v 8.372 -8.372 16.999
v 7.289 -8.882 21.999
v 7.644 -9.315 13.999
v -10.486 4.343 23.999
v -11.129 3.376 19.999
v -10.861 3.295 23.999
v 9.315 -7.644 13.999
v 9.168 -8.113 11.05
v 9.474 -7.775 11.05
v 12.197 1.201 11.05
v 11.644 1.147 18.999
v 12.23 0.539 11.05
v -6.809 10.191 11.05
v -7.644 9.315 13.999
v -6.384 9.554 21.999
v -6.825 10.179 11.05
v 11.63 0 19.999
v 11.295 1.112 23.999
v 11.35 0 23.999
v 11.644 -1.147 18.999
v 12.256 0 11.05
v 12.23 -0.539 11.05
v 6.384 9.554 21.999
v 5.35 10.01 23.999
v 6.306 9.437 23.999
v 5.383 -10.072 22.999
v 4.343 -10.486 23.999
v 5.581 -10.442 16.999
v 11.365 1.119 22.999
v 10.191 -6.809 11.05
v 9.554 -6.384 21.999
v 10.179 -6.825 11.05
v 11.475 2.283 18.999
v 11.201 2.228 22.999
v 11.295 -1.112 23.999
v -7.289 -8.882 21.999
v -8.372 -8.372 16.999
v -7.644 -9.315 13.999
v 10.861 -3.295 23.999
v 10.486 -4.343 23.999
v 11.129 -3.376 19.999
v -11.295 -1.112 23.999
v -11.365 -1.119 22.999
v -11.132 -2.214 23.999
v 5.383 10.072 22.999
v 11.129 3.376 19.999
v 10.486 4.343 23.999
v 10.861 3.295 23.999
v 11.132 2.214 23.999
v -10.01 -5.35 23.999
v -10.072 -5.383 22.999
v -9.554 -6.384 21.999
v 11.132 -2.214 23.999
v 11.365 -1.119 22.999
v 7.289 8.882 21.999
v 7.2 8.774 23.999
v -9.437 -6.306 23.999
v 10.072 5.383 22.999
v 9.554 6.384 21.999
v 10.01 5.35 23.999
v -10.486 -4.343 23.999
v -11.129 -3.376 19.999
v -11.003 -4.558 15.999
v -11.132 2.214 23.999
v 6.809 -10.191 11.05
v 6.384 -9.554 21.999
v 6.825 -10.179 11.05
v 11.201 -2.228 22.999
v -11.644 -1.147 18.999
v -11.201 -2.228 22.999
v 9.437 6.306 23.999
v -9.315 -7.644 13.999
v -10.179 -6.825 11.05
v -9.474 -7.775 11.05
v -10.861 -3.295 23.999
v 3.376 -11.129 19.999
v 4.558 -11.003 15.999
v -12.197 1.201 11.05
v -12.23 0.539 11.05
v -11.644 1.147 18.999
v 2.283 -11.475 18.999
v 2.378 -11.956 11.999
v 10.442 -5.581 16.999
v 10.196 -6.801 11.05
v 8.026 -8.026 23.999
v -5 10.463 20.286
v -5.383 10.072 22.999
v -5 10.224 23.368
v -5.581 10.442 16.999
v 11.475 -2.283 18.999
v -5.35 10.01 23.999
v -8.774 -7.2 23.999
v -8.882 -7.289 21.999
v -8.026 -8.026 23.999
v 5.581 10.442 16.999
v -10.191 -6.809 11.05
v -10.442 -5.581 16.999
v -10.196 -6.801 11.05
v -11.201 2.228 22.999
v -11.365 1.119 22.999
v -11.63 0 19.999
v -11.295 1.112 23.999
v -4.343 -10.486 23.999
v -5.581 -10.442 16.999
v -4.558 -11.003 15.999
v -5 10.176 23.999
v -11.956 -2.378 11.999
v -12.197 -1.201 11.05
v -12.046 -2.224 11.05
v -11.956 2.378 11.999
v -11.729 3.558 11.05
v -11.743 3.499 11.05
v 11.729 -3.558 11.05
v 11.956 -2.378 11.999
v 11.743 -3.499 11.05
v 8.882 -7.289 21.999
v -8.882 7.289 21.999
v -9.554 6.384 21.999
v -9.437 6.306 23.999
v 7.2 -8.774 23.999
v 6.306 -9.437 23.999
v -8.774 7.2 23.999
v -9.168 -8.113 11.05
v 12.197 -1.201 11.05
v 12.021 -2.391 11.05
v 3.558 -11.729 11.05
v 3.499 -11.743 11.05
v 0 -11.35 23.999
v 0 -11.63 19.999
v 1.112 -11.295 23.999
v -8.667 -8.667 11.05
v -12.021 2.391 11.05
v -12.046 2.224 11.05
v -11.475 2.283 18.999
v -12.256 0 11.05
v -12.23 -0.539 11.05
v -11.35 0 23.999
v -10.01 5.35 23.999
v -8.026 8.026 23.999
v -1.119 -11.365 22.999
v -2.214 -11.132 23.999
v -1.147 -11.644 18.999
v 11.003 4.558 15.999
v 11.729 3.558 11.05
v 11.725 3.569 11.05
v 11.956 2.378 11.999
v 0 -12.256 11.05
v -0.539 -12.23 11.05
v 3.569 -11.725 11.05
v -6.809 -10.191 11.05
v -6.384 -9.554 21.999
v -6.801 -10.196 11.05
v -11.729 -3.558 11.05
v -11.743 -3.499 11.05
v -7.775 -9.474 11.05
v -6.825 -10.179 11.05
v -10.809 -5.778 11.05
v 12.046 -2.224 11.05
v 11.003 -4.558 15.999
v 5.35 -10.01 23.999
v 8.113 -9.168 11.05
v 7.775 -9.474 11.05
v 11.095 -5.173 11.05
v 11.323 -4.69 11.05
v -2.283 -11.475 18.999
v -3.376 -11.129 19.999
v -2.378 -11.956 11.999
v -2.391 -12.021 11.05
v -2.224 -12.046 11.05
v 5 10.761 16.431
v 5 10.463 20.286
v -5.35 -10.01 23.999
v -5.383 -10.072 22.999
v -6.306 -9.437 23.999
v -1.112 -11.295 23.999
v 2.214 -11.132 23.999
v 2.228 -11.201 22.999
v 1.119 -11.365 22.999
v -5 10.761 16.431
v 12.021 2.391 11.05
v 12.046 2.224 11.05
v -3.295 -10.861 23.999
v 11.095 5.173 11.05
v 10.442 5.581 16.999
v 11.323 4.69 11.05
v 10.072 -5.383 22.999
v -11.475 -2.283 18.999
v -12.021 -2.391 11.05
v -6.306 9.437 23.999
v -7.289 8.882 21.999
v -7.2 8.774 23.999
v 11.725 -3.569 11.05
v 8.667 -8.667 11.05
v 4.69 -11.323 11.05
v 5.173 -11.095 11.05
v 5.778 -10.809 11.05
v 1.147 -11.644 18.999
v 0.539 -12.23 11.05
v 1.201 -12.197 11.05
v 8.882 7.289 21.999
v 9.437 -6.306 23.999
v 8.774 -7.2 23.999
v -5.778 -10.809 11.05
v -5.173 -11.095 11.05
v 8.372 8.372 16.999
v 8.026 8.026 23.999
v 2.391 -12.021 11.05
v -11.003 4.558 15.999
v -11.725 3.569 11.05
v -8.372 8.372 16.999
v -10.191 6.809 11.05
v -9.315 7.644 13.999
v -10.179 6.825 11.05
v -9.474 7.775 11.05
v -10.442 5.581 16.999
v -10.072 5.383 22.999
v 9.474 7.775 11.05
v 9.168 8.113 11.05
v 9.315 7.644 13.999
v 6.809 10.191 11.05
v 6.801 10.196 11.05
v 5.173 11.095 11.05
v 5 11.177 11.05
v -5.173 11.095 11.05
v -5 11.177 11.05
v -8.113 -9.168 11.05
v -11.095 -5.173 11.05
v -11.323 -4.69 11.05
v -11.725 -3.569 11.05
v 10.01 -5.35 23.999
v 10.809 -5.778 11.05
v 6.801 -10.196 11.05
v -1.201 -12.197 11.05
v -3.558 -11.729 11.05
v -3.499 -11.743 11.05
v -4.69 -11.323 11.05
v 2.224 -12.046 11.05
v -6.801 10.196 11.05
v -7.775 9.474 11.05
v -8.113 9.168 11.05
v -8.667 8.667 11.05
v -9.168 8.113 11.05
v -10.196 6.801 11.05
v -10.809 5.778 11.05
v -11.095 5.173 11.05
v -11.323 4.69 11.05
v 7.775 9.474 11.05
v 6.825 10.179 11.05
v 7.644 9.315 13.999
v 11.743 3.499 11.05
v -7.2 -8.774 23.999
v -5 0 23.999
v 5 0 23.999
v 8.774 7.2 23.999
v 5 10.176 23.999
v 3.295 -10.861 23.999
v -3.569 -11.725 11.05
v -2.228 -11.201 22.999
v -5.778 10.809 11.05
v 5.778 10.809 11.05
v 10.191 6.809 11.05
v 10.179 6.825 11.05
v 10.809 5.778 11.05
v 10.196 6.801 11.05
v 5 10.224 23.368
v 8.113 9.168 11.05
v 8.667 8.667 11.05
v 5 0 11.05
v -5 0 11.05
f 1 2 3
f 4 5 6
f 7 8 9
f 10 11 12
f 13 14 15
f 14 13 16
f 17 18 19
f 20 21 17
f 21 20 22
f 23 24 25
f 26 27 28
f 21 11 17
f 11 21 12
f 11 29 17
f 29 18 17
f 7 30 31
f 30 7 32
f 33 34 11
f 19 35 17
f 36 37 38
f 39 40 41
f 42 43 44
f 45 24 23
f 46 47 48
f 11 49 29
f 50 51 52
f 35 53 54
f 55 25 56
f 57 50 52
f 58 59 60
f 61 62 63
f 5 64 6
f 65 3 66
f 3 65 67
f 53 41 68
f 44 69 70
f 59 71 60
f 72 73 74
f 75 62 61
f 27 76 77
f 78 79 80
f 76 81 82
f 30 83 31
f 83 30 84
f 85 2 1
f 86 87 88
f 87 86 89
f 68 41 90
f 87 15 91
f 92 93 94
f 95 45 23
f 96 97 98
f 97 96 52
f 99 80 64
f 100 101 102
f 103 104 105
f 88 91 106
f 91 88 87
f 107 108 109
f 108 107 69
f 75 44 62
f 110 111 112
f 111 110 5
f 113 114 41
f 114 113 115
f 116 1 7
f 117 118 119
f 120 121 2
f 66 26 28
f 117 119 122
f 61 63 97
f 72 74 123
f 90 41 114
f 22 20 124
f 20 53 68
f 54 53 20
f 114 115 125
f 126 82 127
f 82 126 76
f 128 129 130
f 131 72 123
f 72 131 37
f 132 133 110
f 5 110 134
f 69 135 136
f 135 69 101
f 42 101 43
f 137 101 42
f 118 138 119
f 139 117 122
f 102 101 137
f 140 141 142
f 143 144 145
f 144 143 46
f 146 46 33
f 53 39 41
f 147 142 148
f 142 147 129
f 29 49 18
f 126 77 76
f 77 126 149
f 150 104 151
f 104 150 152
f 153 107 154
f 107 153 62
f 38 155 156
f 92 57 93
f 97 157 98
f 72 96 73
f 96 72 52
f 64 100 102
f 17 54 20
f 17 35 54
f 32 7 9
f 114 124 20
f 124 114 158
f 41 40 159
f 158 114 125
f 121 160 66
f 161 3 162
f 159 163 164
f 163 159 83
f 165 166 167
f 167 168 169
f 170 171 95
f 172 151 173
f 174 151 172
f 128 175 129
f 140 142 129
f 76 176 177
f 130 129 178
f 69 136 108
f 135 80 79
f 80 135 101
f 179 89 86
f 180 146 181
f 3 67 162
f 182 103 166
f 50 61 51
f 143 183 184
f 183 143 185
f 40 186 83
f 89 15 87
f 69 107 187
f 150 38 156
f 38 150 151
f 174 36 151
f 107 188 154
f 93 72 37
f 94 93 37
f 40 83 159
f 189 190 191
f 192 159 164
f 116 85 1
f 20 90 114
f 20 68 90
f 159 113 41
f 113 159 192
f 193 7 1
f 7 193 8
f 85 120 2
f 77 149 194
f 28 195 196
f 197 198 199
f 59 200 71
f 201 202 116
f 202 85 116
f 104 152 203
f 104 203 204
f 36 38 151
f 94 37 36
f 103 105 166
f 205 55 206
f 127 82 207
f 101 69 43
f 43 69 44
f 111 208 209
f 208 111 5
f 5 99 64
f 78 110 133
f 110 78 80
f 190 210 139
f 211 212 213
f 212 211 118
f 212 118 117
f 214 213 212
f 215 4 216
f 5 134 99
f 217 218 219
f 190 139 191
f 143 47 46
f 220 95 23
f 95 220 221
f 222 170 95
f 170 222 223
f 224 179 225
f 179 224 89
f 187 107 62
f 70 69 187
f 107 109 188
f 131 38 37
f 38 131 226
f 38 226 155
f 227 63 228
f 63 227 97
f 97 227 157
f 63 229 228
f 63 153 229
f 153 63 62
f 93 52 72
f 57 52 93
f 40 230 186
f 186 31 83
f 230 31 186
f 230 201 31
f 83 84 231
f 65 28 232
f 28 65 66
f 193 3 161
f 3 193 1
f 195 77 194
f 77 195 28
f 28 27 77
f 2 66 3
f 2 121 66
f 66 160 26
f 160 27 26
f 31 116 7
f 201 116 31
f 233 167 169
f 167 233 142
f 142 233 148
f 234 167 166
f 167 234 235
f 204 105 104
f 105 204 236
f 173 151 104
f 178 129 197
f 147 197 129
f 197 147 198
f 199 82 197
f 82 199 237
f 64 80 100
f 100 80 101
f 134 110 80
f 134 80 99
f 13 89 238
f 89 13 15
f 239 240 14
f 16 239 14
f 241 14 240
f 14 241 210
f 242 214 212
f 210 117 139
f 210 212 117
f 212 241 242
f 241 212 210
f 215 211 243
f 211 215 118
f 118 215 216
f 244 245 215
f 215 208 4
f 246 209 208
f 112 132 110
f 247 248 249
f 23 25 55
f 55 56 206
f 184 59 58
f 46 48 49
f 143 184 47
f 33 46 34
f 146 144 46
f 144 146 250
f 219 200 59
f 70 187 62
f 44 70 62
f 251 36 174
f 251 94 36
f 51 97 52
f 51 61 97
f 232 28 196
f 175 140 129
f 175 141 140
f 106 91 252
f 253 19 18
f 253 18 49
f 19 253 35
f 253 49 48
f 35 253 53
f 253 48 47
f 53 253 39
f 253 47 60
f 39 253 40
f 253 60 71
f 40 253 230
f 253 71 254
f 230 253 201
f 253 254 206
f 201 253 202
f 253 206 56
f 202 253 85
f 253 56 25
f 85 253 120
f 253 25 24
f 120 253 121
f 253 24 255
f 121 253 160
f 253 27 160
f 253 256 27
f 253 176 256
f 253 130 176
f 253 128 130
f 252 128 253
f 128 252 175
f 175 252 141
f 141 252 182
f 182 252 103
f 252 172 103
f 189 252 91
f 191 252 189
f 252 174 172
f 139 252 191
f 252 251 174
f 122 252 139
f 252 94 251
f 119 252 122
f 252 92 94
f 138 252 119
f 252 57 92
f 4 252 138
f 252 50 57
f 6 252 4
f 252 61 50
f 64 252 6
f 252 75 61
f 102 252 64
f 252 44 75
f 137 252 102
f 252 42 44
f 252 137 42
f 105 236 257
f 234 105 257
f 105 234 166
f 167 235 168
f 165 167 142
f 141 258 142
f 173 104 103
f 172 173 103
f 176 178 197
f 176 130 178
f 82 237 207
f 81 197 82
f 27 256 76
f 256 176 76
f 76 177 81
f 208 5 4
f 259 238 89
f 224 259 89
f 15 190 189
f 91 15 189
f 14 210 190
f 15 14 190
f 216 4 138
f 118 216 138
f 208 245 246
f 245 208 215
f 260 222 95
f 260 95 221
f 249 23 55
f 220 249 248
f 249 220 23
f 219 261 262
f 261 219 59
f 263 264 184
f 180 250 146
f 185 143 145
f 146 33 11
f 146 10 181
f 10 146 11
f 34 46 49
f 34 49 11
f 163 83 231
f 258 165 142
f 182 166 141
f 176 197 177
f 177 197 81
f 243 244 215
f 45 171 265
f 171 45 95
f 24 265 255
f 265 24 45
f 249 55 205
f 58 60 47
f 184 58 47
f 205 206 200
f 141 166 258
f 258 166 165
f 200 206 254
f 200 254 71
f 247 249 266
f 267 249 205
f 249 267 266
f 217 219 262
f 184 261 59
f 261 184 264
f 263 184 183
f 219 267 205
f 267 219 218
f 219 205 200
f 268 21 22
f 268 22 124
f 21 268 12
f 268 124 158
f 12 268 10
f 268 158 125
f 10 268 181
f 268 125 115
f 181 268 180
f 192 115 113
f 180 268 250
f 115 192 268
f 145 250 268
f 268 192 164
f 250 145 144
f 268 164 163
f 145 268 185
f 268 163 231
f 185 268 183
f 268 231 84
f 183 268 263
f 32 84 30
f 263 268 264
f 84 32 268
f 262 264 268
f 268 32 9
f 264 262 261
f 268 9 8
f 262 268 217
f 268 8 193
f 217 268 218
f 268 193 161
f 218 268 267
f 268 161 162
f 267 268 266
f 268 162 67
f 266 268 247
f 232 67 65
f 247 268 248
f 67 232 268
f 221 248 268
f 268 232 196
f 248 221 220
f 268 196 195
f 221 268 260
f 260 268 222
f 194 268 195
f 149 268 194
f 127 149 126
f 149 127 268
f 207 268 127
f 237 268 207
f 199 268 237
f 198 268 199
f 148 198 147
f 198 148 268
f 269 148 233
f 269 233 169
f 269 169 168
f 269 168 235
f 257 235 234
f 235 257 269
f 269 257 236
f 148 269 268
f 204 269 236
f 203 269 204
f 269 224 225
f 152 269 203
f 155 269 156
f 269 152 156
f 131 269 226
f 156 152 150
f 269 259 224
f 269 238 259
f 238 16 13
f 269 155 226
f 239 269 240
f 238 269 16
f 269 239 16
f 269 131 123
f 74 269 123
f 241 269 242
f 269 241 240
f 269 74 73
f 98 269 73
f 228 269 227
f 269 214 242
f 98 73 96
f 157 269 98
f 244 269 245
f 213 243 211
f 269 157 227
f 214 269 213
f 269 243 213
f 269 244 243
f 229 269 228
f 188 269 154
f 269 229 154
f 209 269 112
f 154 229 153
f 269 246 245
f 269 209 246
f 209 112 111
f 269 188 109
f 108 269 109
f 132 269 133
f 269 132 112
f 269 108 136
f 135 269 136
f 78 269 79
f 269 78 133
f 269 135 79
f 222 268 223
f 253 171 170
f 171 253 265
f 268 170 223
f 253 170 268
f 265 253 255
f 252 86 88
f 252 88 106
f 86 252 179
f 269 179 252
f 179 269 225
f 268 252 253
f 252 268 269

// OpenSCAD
difference(){
	union(){
		cylinder(h=11.950000, r1=4.000000, r2=4.000000, center=false, $fa=12, $fs=2, $fn=0);
		translate([0.000000, 0.000000, 3.999000])
			linear_extrude(height=20.000000, center=false, convexity=10, slices=20, scale=[0.890196, 0.890196], $fn=16)
				circle(12.750000, $fa=12, $fs=2, $fn=64);
	}
	translate([0.000000, 0.000000, -0.100000])
		cylinder(h=11.150000, r1=24.200000, r2=24.200000, center=false, $fa=12, $fs=2, $fn=64);
	translate([0.000000, 12.750000, 12.000000])
		cube(size=[10.000000, 25.500000, 24.200000], center=true);
}
